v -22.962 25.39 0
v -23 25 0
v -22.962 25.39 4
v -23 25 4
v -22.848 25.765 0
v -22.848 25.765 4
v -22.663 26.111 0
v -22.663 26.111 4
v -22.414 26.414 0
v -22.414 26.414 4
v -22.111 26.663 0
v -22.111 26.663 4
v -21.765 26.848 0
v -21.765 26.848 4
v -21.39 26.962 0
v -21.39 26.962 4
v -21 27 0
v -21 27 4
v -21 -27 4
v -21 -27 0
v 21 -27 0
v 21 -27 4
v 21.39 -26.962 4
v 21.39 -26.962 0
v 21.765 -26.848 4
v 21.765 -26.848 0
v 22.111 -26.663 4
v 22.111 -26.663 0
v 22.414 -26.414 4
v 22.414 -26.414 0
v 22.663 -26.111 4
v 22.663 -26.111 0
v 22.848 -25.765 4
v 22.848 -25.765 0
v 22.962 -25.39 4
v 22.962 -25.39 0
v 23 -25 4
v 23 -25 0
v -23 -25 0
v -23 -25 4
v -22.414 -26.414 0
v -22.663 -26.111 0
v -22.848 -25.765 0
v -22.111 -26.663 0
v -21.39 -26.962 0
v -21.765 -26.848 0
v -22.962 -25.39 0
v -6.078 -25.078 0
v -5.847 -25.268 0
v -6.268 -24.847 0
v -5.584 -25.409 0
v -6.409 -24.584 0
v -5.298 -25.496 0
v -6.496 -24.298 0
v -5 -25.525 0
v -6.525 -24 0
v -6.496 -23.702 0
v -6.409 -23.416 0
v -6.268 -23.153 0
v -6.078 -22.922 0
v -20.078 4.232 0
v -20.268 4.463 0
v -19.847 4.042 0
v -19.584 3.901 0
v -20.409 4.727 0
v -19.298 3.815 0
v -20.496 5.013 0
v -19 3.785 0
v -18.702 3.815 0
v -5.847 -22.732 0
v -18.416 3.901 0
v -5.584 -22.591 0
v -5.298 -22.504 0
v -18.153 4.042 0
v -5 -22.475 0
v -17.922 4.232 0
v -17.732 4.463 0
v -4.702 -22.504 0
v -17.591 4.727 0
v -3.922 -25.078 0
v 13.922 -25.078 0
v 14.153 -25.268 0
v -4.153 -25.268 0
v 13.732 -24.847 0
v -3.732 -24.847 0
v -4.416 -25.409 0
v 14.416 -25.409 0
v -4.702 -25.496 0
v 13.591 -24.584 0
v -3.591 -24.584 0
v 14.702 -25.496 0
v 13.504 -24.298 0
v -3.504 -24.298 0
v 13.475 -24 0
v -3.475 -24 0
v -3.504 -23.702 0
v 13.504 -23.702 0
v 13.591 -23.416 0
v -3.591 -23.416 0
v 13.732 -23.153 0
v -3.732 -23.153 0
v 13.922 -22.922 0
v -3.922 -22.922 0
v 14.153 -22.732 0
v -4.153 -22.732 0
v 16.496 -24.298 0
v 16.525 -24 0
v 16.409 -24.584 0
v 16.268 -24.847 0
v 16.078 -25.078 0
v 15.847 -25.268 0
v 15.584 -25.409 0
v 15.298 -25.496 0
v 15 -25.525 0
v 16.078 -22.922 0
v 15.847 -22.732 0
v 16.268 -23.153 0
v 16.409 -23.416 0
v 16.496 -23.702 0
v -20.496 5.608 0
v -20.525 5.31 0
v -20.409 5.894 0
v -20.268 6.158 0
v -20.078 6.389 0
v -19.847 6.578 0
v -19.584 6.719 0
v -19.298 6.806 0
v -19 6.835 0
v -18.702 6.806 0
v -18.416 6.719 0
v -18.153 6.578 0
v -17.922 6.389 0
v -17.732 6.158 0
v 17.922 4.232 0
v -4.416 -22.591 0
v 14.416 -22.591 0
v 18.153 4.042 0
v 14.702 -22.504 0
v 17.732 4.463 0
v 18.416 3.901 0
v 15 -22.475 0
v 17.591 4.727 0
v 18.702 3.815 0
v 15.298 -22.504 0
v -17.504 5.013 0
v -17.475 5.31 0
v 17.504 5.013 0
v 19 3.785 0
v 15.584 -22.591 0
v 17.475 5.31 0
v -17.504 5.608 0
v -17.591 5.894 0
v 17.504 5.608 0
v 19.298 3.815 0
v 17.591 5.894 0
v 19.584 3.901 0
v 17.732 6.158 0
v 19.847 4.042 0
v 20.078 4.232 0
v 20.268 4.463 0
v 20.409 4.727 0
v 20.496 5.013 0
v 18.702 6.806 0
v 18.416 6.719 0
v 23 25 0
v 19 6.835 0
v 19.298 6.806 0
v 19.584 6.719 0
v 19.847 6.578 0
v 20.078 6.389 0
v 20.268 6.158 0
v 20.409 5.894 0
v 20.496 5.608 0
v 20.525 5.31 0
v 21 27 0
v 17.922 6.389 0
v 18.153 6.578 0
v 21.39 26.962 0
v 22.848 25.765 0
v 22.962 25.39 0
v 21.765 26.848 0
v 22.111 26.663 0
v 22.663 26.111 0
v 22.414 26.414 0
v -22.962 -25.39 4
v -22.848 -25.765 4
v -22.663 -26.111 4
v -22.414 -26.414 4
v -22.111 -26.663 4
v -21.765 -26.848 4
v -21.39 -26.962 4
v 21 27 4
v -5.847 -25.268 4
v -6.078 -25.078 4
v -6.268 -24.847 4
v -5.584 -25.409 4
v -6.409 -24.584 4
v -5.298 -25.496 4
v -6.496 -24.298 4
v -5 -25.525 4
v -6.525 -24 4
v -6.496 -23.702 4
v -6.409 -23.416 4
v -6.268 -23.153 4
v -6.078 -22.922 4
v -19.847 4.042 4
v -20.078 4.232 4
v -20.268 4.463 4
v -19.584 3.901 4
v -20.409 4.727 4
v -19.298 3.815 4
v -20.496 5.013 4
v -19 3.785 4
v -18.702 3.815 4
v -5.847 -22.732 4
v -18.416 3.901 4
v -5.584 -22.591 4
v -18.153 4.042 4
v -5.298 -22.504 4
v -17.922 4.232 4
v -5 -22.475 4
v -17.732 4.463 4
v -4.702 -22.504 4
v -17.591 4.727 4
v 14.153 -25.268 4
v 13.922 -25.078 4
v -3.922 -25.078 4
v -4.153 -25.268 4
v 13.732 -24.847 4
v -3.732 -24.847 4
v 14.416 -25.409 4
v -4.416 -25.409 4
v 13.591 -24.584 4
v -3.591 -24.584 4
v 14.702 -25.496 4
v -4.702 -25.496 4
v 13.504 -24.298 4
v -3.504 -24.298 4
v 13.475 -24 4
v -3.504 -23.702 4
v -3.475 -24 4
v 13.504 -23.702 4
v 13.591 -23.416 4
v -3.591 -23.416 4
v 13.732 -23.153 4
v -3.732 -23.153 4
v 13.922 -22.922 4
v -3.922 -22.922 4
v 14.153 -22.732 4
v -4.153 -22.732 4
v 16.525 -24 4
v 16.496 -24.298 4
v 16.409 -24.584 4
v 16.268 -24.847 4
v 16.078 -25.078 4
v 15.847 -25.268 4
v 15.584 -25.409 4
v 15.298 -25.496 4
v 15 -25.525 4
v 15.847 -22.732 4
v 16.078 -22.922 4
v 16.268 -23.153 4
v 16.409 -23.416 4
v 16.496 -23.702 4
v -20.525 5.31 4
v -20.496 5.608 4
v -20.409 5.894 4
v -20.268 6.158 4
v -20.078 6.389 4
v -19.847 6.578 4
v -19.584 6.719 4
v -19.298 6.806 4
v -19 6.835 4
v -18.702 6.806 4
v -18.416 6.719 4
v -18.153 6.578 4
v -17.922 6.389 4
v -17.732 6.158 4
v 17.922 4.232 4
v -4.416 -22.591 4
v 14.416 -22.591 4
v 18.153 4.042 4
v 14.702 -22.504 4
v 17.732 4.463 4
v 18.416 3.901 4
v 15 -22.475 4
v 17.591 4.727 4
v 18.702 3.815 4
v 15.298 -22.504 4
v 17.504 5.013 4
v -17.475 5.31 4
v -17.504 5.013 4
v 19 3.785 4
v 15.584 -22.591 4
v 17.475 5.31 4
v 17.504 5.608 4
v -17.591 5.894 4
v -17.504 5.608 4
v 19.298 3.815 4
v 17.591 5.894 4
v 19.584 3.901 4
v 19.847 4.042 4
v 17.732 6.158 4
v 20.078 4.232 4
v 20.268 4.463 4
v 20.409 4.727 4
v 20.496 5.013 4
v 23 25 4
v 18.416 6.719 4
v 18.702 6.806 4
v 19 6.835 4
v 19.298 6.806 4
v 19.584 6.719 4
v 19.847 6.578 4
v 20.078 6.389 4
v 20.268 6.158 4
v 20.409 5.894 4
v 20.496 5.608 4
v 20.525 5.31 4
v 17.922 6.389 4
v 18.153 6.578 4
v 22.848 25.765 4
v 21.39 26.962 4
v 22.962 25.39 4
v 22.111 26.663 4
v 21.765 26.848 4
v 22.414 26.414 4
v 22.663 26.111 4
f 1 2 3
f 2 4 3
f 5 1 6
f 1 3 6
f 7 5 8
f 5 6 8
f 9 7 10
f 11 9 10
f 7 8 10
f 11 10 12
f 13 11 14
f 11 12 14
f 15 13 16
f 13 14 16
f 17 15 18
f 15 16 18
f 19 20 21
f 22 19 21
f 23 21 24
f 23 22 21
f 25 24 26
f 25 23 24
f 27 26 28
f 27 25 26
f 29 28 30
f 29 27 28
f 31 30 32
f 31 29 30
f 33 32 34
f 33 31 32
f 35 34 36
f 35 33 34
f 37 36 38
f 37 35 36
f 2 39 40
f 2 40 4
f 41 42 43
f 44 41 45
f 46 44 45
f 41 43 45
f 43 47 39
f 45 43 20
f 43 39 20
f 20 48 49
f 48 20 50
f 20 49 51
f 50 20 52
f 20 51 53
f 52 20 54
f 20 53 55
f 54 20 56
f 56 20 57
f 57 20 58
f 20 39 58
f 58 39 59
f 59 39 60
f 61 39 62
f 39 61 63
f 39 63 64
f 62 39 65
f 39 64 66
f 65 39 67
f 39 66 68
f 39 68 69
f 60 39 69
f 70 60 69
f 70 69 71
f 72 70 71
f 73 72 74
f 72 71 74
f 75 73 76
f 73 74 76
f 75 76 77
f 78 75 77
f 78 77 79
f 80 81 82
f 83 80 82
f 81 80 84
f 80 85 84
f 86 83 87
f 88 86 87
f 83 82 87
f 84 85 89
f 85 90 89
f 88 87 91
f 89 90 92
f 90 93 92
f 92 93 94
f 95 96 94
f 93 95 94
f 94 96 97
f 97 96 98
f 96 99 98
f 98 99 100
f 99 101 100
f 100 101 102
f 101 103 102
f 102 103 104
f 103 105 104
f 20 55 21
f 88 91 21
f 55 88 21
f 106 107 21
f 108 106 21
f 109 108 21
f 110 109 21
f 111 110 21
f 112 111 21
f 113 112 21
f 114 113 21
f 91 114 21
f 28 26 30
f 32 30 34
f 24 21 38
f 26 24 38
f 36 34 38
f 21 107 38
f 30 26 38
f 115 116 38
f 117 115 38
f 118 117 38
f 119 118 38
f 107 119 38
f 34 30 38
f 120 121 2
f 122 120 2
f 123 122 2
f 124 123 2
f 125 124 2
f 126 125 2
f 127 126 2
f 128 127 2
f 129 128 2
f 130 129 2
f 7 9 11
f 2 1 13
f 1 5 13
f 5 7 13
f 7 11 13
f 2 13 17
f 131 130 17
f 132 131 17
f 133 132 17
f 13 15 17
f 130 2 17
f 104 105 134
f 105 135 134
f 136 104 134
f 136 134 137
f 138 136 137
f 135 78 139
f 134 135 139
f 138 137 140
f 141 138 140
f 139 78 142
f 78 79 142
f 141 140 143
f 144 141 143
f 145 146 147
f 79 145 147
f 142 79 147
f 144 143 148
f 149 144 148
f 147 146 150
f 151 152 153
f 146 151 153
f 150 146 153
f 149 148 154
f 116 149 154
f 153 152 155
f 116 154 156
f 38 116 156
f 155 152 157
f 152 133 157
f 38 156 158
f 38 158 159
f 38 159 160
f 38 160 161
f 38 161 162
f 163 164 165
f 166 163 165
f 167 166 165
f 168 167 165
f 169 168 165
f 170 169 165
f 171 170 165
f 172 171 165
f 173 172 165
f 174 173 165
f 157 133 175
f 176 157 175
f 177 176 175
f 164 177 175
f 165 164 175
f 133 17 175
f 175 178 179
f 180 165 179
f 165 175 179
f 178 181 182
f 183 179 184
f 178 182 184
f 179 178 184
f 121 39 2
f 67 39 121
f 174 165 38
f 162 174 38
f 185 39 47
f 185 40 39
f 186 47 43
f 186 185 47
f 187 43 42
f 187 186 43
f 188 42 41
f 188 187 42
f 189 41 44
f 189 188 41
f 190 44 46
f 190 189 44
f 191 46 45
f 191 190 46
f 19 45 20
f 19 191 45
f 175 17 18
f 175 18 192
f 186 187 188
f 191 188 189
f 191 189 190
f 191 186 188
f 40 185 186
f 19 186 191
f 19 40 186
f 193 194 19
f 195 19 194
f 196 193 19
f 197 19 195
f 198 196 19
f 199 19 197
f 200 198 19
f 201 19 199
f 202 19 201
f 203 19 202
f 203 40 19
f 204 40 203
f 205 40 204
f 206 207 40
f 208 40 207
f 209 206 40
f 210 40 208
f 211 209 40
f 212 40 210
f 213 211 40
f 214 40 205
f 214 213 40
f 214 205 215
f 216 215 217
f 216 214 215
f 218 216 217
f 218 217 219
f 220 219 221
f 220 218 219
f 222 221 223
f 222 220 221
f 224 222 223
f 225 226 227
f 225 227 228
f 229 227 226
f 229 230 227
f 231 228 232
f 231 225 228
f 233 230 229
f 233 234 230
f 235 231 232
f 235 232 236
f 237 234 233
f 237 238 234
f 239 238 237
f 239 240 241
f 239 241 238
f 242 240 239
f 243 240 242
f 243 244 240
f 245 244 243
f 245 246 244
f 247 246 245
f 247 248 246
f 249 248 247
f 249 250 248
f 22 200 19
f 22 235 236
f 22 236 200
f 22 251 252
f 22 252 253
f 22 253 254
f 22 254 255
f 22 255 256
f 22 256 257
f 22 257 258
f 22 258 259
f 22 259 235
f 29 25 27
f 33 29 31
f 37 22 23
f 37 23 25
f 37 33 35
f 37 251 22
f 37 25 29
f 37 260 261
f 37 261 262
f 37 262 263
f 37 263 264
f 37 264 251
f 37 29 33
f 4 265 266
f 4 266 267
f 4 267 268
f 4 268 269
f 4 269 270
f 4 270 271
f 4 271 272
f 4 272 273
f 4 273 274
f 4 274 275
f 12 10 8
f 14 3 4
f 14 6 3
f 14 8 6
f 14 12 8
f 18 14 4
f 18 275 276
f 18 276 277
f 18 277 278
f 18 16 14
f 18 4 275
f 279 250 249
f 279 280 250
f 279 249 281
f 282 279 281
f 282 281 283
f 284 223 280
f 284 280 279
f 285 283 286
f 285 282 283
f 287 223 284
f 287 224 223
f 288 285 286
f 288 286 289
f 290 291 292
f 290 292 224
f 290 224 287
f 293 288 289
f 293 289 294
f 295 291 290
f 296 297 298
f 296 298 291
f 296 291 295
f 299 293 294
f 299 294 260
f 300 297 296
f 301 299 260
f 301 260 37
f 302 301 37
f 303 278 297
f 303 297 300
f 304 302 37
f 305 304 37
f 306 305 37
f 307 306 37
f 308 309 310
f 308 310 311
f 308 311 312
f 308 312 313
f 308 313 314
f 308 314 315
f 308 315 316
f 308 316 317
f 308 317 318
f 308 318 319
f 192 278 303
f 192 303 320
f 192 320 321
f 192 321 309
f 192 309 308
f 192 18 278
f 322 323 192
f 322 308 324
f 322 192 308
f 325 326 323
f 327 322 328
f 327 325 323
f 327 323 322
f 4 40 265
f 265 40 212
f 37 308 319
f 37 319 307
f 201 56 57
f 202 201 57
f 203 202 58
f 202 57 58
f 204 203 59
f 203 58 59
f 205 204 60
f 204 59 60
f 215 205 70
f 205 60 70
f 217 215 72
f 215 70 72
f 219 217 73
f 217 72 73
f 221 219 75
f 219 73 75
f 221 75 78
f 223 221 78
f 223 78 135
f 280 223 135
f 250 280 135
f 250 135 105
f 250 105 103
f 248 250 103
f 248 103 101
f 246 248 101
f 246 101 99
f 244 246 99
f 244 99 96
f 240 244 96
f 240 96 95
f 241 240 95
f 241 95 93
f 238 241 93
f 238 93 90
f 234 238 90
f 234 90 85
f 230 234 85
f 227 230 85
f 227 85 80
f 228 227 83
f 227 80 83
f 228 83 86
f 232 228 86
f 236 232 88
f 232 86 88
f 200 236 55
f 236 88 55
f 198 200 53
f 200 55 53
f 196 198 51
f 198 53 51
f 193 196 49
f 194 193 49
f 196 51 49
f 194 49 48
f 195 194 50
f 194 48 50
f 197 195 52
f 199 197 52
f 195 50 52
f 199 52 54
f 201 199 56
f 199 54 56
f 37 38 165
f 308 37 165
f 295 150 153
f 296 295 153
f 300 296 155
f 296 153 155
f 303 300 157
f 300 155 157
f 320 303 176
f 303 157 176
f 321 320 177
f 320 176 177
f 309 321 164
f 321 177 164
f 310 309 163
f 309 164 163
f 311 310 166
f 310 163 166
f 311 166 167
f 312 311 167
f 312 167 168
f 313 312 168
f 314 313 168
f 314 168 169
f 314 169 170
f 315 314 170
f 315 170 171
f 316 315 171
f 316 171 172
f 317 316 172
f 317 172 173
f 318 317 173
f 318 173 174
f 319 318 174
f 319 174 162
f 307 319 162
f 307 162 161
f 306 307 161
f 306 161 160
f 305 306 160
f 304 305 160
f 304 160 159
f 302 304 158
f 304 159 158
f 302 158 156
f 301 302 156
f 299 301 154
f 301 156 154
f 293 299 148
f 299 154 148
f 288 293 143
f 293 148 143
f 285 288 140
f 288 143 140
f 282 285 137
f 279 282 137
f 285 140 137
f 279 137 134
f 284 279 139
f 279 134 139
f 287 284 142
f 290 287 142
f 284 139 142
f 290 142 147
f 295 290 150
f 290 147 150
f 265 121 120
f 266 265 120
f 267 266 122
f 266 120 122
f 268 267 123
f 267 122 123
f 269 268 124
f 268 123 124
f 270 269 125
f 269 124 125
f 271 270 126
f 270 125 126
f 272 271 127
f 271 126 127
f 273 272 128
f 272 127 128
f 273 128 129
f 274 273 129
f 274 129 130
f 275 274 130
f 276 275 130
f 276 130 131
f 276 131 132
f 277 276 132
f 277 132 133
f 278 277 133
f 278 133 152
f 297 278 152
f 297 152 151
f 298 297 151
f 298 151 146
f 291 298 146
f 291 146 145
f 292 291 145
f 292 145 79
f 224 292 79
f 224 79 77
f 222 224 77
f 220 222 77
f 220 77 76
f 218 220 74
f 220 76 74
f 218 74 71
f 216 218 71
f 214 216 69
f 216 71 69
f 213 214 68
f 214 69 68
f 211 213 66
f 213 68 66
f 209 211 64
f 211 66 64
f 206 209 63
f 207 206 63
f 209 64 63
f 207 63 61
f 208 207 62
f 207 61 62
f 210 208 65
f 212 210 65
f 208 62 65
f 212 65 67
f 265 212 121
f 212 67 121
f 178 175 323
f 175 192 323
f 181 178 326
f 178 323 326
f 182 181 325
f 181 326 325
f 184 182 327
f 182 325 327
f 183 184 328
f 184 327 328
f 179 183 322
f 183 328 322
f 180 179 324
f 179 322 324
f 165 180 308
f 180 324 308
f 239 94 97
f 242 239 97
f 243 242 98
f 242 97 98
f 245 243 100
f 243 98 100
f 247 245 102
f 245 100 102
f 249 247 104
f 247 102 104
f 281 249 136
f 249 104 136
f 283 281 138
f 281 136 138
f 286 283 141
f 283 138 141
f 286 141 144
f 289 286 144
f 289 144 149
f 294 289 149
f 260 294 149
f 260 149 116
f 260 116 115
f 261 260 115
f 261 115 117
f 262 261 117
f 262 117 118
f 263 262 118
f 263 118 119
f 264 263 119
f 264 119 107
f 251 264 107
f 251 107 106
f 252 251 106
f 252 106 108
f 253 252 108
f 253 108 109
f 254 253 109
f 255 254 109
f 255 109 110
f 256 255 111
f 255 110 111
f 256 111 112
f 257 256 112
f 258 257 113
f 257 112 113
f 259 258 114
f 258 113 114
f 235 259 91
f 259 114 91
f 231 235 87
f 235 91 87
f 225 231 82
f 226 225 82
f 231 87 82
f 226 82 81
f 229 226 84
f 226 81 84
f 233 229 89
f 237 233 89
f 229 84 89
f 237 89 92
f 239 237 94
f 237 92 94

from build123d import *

# Parameters (mm, degrees)
SKETCH_1_W          = 46
SKETCH_1_H          = 54
EXTRUDE_1_DEPTH     = 4
SKETCH_5_R          = 1.525
CUT_EXTRUDE_1_DEPTH = 54
FILLET_1_R          = 2


with BuildPart() as part:
    # 草图1 → 凸台-拉伸1 (new body)
    with BuildSketch(Plane.XY):
        Rectangle(SKETCH_1_W, SKETCH_1_H)
    extrude(amount=EXTRUDE_1_DEPTH)

    # 草图5 → 切除-拉伸1 (cut)
    with BuildSketch(Plane(origin=(0, 0, 0), x_dir=(-1, 0, 0), z_dir=(0, 0, -1))):
        with Locations((5, -24)):
            Circle(SKETCH_5_R)
        with Locations((-15, -24)):
            Circle(SKETCH_5_R)
        with Locations((-19, 5.310310448)):
            Circle(SKETCH_5_R)
        with Locations((19, 5.310310448)):
            Circle(SKETCH_5_R)
    extrude(amount=-CUT_EXTRUDE_1_DEPTH, mode=Mode.SUBTRACT)

    # 圆角1
    fillet_1_edges = [part.edges().sort_by_distance(p)[0] for p in [
        (23, -27, 2),
        (-23, -27, 2),
        (-23, 27, 2),
        (23, 27, 2),
    ]]
    fillet(fillet_1_edges, radius=FILLET_1_R)


solid = part.part
